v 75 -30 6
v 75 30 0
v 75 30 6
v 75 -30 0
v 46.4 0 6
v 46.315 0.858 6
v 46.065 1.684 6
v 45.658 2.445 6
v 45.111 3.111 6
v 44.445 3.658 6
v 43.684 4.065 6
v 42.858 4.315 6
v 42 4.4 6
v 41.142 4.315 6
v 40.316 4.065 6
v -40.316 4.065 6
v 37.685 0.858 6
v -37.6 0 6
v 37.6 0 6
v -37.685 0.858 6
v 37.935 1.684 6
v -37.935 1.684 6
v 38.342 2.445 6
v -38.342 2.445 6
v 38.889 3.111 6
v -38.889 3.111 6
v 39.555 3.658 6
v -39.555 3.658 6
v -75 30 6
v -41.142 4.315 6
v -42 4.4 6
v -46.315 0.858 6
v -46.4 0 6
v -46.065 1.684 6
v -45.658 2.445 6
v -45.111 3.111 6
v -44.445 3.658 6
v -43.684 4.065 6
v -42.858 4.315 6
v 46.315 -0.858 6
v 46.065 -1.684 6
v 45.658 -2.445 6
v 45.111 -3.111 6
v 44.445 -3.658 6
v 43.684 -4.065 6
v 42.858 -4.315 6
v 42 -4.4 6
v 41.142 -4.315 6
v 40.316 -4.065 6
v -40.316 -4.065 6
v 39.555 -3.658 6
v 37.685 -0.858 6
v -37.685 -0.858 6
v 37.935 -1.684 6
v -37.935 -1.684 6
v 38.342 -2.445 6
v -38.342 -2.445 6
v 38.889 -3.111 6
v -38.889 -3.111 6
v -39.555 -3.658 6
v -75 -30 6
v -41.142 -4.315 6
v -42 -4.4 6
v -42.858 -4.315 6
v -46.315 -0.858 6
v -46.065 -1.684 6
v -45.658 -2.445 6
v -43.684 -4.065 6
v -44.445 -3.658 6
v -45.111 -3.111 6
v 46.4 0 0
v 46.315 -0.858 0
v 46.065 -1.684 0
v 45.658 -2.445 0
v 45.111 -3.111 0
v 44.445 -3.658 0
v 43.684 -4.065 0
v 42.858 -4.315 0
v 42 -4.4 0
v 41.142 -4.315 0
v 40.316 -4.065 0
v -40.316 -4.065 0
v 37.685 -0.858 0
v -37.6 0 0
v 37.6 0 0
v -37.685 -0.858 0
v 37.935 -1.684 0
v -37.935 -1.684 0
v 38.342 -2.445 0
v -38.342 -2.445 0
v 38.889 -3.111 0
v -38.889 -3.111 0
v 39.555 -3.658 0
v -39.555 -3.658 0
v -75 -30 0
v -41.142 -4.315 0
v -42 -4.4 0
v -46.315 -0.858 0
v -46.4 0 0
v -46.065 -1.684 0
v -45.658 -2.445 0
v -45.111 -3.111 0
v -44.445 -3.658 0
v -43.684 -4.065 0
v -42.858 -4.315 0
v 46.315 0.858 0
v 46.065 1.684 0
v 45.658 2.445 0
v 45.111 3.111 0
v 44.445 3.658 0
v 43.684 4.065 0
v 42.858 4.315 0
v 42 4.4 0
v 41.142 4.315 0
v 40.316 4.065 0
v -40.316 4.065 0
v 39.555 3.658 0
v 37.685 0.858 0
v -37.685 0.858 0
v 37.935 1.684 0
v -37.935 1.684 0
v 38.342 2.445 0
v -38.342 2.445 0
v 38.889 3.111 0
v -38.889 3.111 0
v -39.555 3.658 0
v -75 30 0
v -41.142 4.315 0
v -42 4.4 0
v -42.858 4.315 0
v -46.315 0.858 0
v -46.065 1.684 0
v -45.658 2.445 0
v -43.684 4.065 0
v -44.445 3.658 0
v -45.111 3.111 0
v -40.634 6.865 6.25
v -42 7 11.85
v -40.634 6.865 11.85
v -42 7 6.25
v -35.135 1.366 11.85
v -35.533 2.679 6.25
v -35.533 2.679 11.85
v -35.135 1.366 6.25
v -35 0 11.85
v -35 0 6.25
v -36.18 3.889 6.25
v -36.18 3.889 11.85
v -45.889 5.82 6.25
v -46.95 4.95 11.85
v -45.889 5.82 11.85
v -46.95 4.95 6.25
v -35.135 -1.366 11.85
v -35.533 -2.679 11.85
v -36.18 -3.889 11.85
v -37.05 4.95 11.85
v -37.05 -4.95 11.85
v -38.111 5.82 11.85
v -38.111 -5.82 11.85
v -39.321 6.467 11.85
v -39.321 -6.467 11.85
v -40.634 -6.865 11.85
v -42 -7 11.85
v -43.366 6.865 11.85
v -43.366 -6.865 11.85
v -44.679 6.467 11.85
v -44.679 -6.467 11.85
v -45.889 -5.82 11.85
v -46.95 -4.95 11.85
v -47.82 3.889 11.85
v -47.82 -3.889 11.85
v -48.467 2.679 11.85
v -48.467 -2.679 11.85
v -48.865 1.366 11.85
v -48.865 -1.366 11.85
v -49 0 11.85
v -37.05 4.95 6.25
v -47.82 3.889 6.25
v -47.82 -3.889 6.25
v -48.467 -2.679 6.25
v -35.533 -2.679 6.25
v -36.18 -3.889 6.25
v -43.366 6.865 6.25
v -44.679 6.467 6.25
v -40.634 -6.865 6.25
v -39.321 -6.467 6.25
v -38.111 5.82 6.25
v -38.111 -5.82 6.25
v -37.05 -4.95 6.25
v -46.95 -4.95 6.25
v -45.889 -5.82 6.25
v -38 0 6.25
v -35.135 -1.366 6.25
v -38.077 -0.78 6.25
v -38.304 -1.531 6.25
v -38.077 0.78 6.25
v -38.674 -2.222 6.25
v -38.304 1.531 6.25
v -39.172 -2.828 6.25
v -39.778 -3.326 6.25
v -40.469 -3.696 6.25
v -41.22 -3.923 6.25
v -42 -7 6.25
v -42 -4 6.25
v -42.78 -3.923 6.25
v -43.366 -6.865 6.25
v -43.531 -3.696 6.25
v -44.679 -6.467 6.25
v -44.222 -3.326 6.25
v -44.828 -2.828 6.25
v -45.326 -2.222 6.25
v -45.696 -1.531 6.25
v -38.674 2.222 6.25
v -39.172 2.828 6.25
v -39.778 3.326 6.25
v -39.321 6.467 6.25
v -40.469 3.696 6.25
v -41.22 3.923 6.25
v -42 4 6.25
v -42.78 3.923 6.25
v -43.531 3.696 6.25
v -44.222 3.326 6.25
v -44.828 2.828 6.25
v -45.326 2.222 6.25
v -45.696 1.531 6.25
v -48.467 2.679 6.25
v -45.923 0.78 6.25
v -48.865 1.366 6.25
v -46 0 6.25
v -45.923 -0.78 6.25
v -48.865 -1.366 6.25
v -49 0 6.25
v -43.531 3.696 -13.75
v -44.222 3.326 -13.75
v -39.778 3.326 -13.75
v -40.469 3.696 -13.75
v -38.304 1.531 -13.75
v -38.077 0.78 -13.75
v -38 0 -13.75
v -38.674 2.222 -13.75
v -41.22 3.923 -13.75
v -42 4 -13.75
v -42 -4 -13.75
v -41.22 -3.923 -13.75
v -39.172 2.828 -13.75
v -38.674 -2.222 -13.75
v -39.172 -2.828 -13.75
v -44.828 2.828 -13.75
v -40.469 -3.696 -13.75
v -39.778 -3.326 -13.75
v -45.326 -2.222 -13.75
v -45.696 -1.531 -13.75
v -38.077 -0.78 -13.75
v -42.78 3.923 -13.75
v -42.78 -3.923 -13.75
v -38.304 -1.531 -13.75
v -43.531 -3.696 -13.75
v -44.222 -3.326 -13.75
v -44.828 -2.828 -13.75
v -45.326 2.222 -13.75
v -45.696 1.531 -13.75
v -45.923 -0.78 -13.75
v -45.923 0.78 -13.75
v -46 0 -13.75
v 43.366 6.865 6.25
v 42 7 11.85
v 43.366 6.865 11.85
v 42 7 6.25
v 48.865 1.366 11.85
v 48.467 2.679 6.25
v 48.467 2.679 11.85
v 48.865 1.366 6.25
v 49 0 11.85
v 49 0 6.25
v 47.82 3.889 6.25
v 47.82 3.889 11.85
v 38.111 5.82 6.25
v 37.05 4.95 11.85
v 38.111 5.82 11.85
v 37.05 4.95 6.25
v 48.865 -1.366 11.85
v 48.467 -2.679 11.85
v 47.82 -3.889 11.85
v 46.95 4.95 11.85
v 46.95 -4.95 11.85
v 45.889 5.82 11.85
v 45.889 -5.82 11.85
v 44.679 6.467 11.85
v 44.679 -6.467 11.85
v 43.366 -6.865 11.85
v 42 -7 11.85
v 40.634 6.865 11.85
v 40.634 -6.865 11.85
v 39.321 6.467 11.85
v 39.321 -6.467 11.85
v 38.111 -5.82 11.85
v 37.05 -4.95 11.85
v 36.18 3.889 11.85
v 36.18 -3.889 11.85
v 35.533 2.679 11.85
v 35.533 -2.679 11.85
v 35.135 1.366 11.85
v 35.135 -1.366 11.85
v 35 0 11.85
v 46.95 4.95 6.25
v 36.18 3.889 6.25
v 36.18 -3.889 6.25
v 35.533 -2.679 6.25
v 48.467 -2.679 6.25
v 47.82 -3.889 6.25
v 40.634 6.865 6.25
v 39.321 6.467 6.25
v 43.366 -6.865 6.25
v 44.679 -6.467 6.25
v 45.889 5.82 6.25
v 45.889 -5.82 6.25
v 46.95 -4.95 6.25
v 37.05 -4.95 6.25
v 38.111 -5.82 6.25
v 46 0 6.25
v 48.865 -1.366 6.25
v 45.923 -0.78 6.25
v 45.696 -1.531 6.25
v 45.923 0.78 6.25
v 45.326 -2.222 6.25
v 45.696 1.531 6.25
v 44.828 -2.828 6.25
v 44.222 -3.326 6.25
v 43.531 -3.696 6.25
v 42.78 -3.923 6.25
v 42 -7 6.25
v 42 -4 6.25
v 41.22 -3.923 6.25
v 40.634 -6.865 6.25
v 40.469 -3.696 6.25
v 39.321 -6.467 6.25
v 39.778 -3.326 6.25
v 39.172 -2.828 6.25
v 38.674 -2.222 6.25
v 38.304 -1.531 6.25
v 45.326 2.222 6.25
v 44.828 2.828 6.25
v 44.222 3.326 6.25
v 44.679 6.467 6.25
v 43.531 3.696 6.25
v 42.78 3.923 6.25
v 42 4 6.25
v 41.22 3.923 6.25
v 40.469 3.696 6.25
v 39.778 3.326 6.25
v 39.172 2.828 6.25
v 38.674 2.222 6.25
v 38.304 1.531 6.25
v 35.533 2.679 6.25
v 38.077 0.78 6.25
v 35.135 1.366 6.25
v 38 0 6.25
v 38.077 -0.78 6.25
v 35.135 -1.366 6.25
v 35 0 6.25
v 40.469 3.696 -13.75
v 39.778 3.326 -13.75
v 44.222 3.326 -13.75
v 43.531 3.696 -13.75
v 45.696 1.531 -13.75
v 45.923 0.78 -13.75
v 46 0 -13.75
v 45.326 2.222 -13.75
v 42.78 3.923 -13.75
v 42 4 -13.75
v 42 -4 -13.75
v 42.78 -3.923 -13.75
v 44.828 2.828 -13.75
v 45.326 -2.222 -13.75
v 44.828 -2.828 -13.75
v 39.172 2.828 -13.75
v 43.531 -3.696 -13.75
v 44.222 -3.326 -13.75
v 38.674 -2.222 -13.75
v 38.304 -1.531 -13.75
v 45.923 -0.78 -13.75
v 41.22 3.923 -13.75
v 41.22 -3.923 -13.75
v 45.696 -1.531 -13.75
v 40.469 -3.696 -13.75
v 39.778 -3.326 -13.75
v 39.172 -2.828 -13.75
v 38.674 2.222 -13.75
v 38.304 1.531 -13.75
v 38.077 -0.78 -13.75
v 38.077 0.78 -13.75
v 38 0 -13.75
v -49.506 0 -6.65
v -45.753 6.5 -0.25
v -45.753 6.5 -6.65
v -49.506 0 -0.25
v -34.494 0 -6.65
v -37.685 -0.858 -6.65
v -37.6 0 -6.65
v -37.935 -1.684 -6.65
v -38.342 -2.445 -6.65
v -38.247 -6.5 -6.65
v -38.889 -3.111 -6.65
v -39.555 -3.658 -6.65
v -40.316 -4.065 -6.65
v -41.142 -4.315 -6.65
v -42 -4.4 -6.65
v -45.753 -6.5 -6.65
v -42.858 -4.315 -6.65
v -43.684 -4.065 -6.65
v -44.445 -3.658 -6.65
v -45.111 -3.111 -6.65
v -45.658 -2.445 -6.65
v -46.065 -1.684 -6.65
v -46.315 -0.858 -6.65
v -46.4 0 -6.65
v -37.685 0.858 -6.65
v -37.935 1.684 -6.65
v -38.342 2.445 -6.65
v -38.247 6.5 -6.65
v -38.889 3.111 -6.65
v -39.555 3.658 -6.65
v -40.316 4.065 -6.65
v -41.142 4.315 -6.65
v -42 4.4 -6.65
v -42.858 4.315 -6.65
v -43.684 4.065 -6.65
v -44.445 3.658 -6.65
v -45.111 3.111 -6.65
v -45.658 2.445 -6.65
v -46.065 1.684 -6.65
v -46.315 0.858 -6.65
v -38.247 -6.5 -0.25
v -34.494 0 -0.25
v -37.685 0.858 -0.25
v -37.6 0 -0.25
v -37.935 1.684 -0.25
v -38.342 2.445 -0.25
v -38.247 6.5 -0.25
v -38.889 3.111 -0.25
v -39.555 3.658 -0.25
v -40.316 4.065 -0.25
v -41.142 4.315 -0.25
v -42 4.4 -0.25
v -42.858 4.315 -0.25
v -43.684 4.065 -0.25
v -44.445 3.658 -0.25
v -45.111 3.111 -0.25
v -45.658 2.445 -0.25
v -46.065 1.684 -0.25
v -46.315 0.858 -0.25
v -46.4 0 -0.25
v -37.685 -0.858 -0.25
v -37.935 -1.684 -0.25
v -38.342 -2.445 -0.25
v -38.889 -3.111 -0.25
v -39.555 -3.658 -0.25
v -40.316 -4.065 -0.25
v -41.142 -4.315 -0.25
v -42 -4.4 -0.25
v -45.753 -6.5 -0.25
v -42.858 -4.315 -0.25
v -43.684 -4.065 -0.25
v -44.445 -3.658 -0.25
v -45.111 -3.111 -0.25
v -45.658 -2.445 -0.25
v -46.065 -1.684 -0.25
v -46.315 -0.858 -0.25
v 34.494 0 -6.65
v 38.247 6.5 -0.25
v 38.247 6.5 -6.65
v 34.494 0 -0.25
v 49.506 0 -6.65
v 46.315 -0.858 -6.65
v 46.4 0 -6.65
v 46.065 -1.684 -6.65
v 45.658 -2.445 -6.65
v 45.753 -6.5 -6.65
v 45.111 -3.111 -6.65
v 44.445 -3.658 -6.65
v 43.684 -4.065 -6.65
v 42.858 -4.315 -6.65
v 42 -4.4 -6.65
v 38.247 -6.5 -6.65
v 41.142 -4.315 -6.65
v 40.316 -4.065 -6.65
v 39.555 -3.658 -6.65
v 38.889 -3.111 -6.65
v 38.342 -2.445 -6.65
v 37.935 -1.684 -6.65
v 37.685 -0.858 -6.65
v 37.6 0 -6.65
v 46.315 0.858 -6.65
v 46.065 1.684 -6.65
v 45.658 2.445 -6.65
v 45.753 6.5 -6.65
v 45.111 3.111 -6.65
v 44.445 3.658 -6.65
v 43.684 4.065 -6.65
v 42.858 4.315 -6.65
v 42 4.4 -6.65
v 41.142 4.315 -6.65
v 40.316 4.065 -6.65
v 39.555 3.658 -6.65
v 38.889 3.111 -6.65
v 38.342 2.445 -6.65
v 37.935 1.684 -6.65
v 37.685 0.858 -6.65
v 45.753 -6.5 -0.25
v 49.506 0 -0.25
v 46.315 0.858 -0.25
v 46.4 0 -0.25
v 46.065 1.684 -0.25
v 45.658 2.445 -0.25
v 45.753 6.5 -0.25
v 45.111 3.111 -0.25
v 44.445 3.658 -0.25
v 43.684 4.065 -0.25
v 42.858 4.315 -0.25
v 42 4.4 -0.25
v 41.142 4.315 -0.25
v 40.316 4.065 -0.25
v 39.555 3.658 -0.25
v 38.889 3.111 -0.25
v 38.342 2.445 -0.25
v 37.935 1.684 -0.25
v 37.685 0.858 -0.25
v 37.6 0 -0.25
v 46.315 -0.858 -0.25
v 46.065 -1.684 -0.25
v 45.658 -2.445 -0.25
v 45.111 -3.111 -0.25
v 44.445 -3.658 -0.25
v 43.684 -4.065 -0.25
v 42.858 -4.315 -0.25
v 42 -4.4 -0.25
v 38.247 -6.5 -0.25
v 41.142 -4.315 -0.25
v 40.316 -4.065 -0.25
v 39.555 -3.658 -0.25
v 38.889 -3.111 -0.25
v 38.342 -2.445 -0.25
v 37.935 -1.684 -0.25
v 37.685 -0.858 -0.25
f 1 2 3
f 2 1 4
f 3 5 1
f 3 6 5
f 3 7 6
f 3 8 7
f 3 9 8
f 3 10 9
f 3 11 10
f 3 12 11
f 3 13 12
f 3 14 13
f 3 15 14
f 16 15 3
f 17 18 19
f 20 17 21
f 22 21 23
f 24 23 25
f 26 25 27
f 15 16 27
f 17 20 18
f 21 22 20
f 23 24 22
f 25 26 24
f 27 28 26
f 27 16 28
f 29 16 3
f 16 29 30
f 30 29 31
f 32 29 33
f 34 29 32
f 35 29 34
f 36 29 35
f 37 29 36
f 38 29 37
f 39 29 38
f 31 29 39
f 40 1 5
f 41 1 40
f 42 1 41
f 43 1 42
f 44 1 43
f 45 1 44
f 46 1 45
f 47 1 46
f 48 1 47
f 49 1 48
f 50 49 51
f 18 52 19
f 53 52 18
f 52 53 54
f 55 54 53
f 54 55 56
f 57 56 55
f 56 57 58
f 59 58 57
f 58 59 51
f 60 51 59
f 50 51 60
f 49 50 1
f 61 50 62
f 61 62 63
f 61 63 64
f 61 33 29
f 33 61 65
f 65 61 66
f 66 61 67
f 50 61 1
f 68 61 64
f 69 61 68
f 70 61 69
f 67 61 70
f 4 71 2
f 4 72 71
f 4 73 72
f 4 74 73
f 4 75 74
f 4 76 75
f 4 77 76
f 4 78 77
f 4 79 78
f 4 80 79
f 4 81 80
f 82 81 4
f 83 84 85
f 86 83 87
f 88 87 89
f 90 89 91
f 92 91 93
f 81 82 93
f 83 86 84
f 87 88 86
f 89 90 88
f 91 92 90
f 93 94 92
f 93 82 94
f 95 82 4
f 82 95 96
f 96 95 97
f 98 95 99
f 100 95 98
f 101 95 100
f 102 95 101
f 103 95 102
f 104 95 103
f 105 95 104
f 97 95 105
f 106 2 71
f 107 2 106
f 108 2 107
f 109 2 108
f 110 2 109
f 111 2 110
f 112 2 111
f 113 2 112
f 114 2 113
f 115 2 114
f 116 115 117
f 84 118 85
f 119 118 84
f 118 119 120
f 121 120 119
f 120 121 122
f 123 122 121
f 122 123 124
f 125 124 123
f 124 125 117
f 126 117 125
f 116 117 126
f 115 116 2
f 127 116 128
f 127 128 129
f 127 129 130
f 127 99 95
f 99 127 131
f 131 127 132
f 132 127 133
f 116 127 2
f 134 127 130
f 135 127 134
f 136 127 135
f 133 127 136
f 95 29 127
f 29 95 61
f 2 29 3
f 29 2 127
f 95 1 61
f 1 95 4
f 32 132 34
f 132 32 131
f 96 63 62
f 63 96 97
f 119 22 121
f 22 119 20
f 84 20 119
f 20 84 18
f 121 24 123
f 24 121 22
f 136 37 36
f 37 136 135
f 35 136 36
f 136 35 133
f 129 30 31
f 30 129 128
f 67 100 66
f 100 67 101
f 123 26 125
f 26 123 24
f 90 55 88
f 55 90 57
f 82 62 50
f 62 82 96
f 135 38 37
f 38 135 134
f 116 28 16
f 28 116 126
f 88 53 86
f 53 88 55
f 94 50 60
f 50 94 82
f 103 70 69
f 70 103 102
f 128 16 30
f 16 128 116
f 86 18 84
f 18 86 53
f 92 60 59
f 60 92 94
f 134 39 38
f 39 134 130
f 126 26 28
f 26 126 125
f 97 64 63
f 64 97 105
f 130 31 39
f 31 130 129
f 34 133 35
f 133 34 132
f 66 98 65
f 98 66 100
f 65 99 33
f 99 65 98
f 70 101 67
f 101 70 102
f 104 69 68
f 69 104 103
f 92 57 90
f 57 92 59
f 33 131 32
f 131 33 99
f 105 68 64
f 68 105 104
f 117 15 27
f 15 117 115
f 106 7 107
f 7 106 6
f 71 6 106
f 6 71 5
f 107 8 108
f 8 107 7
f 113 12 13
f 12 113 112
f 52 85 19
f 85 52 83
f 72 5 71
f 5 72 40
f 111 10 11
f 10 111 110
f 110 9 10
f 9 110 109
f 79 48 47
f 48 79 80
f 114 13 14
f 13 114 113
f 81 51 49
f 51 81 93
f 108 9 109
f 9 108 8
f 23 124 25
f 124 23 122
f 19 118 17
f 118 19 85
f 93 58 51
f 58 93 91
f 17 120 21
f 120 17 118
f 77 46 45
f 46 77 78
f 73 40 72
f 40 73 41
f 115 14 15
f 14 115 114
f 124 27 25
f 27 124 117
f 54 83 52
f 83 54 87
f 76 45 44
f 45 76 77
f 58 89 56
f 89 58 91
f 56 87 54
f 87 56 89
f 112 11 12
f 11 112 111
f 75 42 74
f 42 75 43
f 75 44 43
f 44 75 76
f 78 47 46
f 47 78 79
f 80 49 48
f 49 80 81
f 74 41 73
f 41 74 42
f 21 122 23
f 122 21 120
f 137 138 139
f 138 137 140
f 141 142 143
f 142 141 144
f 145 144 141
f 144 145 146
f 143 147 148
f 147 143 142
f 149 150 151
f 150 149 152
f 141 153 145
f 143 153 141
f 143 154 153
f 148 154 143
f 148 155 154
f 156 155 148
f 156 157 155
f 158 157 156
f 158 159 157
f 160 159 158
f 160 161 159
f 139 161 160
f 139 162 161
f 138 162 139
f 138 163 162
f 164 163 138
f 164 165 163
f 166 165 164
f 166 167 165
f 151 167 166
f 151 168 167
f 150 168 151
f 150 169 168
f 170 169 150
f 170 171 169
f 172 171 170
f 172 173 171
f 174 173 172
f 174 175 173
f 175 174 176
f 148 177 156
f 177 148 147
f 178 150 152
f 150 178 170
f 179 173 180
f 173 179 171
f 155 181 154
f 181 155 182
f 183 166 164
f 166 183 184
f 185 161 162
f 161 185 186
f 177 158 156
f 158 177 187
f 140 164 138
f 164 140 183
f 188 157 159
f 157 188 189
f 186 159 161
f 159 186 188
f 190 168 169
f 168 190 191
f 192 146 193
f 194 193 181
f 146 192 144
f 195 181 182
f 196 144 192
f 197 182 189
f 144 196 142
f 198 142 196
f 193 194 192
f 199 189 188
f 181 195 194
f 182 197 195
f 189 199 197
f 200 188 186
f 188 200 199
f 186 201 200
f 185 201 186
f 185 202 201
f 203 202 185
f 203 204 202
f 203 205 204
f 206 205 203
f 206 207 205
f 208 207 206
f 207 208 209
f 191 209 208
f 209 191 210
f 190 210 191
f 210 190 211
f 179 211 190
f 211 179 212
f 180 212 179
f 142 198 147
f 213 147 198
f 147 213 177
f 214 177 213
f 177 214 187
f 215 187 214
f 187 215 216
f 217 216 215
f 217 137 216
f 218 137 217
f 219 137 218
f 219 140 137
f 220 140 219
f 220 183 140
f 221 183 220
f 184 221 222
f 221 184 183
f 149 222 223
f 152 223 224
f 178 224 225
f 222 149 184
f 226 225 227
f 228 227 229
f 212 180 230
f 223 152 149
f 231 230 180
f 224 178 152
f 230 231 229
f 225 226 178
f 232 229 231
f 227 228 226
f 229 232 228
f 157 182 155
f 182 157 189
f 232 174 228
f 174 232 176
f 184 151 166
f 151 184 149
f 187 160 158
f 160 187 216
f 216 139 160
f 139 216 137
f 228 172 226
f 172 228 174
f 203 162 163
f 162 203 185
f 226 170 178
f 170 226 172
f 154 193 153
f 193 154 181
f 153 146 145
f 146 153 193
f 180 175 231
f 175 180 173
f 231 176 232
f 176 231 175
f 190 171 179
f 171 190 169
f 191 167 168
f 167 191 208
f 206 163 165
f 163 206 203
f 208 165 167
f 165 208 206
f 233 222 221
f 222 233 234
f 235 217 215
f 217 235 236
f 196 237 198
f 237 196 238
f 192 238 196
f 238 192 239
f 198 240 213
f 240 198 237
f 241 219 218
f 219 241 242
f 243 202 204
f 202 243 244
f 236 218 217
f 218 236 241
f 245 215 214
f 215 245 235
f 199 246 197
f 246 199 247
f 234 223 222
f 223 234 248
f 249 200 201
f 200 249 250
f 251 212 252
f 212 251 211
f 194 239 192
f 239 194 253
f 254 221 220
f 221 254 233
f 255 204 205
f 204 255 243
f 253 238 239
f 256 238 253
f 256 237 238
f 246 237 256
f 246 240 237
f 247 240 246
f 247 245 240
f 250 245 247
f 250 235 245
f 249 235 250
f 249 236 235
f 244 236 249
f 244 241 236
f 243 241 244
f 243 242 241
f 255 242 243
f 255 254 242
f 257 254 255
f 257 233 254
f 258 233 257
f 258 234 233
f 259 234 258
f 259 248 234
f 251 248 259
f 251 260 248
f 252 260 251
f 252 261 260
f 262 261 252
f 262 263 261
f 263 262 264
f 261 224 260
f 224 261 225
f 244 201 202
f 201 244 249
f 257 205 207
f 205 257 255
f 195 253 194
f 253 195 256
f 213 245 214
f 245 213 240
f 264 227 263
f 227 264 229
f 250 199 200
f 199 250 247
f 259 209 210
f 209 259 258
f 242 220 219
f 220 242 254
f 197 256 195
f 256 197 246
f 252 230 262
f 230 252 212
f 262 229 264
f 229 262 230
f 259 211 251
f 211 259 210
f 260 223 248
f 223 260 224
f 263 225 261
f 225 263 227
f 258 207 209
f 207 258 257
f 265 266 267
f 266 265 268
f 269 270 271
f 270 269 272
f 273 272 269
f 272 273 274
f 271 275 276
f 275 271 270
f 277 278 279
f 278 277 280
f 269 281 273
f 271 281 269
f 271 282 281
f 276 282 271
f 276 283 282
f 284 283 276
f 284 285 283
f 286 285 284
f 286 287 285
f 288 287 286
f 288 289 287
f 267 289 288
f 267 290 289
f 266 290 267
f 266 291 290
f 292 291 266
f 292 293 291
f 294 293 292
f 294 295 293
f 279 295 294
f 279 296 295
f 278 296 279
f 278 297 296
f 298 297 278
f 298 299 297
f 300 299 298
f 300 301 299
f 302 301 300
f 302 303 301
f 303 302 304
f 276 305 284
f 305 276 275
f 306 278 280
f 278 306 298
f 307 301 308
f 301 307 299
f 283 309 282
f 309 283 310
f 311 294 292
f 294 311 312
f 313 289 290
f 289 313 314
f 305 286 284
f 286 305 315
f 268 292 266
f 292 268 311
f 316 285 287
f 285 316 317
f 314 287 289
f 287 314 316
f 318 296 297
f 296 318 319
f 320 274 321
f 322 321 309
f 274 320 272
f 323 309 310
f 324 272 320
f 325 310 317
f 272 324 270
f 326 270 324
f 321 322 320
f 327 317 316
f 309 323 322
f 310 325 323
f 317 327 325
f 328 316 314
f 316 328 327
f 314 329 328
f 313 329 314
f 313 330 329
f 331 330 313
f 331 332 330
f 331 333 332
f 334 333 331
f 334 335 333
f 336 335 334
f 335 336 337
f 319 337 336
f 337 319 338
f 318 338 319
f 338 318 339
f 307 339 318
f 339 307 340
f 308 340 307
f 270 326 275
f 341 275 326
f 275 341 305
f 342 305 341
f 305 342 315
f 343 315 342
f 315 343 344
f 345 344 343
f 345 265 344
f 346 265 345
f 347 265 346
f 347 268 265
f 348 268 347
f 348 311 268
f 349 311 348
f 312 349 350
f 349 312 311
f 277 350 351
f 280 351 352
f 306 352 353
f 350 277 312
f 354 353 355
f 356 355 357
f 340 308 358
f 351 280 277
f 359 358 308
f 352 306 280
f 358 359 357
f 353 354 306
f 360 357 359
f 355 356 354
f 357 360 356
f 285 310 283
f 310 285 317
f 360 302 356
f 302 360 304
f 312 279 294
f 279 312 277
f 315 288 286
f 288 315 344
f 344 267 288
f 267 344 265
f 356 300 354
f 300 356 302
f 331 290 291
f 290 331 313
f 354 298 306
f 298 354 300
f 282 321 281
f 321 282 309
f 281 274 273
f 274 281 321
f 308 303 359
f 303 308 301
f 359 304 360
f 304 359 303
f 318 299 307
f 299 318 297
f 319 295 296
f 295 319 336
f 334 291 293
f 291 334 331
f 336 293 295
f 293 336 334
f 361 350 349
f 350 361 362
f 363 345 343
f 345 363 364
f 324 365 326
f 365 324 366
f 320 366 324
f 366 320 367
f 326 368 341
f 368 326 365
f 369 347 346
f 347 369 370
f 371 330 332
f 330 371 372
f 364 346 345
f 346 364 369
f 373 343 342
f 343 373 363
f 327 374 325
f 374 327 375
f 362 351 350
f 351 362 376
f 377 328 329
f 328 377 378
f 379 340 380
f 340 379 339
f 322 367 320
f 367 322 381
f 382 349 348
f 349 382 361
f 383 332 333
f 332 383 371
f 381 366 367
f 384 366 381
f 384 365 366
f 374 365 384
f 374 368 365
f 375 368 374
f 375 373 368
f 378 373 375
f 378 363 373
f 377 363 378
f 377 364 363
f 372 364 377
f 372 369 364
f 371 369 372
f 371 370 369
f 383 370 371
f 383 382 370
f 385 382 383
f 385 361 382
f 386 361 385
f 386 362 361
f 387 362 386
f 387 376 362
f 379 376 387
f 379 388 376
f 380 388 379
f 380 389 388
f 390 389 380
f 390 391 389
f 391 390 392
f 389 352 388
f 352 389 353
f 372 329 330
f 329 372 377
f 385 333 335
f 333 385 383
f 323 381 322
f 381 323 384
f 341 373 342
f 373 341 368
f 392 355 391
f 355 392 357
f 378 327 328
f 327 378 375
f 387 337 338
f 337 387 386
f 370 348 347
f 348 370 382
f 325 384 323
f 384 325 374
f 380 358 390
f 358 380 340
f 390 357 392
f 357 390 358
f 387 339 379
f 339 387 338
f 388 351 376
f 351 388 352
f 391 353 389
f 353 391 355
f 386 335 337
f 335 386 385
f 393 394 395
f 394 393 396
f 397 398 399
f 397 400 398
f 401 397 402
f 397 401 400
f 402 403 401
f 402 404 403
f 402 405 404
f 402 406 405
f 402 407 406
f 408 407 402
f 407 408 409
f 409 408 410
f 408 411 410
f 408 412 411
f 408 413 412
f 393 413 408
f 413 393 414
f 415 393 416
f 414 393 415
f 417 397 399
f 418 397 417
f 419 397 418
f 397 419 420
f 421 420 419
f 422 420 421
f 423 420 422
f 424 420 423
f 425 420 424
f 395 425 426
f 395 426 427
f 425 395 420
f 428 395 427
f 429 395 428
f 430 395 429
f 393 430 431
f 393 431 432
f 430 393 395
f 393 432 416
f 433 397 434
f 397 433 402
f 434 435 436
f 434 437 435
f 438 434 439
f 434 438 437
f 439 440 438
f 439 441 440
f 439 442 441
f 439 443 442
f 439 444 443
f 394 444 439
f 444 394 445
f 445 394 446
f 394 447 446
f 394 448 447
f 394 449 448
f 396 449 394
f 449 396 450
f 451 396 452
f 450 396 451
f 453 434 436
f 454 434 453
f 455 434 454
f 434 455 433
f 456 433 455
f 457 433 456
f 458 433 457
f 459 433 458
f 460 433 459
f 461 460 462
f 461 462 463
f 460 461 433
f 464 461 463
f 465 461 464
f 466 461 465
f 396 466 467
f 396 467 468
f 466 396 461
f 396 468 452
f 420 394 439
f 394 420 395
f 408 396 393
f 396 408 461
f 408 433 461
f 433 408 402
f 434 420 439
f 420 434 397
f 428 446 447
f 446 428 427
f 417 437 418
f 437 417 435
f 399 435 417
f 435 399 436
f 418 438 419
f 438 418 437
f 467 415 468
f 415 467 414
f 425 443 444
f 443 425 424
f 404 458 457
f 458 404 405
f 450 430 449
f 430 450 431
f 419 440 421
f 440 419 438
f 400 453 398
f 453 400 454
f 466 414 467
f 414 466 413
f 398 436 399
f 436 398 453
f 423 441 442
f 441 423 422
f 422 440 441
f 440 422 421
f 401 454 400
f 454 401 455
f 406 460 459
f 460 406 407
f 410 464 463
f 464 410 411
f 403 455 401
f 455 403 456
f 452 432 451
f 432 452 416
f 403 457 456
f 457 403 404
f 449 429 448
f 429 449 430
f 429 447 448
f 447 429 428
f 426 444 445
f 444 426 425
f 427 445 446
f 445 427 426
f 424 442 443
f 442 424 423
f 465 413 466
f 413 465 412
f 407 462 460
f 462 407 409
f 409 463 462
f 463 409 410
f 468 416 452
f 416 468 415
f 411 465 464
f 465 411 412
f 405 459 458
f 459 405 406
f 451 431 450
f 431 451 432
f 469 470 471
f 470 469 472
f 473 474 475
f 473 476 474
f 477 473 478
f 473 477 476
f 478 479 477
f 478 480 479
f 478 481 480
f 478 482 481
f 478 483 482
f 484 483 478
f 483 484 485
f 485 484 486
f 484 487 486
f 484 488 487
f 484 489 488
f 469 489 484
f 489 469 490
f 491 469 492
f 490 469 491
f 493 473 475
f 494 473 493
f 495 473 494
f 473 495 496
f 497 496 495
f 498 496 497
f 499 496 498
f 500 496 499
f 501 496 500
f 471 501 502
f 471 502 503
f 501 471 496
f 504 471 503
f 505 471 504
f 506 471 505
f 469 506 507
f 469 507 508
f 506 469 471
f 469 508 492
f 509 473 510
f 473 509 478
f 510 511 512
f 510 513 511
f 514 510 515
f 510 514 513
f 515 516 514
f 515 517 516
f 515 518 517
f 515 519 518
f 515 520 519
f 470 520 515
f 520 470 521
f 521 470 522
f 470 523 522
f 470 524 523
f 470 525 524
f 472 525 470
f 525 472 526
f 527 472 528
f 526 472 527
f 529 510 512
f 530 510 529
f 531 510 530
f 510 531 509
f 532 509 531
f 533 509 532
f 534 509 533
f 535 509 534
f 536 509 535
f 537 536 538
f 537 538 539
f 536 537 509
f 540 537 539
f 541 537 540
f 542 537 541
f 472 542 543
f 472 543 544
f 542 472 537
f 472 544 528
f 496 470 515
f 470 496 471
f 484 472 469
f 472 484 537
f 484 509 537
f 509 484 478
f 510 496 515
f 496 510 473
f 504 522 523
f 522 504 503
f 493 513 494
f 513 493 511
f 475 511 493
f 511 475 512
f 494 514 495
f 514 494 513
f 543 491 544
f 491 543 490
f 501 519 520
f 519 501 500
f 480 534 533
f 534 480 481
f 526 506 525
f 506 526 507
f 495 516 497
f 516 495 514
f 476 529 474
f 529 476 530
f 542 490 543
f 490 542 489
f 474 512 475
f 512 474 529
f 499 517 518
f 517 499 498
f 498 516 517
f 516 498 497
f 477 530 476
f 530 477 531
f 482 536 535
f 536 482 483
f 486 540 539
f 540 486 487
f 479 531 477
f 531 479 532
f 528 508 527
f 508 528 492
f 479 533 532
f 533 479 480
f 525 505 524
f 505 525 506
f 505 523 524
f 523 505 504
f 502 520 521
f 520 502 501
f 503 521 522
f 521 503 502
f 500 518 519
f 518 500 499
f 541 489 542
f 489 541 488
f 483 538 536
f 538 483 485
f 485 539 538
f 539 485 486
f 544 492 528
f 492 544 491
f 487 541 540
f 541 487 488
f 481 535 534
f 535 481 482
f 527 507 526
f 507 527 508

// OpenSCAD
$fn = 32;

// ------------------------------------------------------------------------
// Bolted plate: 150 x 60 x 6 mm plate, 2 fasteners
// Every part is its own module, assembly() places them once.
// ------------------------------------------------------------------------

// --- part 1 ---
module plate() {
  difference() {
    translate([-75, -30, 0]) cube([150, 60, 6]);
    translate([-42, 0, -1]) cylinder(h = 8, d = 8.8);
    translate([42, 0, -1]) cylinder(h = 8, d = 8.8);
  }
}

// --- part 2 ---
module bolt1() {
  cylinder(h = 5.6, d = 14);
  translate([0, 0, -20]) cylinder(h = 20, d = 8);
}

// --- part 3 ---
module bolt2() {
  cylinder(h = 5.6, d = 14);
  translate([0, 0, -20]) cylinder(h = 20, d = 8);
}

// --- part 4 ---
module nut1() {
  difference() {
    linear_extrude(height = 6.4) polygon(points = [[7.506, 0], [3.753, 6.5], [-3.753, 6.5], [-7.506, 0], [-3.753, -6.5], [3.753, -6.5]]);
    translate([0, 0, -1]) cylinder(h = 8.4, d = 8.8);
  }
}

// --- part 5 ---
module nut2() {
  difference() {
    linear_extrude(height = 6.4) polygon(points = [[7.506, 0], [3.753, 6.5], [-3.753, 6.5], [-7.506, 0], [-3.753, -6.5], [3.753, -6.5]]);
    translate([0, 0, -1]) cylinder(h = 8.4, d = 8.8);
  }
}

// --- assembly ---
module assembly() {
  translate([0, 0, 0]) rotate([0, 0, 0]) plate();
  translate([-42, 0, 6.25]) rotate([0, 0, 0]) bolt1();
  translate([42, 0, 6.25]) rotate([0, 0, 0]) bolt2();
  translate([-42, 0, -6.65]) rotate([0, 0, 0]) nut1();
  translate([42, 0, -6.65]) rotate([0, 0, 0]) nut2();
}

assembly();
